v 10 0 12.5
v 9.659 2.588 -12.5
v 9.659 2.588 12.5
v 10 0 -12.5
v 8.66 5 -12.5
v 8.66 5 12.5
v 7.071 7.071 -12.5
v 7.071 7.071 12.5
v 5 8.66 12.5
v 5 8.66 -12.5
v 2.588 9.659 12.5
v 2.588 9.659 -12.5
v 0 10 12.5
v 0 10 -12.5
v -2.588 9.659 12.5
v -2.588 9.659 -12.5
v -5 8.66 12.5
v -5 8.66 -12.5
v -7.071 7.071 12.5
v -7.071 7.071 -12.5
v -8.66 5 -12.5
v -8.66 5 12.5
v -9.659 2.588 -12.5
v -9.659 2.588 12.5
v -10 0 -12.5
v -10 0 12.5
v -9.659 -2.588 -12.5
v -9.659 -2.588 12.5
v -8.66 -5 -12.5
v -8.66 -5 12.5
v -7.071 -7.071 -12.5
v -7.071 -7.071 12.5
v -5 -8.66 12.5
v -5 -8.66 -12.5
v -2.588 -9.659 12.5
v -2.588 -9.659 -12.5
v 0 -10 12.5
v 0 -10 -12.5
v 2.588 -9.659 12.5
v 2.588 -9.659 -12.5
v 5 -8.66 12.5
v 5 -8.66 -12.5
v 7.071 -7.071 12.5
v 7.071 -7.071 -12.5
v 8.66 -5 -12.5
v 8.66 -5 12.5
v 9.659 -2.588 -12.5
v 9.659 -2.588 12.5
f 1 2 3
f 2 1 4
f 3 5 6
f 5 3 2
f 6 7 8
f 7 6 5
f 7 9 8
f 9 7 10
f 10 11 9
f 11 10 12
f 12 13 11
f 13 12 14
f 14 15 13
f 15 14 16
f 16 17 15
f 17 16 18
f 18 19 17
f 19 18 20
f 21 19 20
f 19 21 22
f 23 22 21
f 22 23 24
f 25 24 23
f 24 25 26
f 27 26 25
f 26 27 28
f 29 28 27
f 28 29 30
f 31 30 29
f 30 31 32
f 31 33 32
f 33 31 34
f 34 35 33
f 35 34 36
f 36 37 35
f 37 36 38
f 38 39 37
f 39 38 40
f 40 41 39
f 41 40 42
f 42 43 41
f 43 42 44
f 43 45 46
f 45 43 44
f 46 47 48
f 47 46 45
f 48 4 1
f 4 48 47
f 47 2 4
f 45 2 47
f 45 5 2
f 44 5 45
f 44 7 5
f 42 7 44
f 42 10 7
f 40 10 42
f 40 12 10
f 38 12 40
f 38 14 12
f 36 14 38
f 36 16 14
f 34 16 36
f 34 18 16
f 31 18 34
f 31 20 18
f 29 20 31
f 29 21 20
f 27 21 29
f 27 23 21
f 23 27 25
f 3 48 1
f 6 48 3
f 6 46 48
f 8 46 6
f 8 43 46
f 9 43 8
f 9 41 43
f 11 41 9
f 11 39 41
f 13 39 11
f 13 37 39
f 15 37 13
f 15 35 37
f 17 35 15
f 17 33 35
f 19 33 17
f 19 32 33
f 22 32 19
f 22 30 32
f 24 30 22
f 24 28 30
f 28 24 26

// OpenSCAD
// Cylinder rendering test  
$fn = 24; // Smooth cylinder

// Cylinder with height and radius
cylinder(h=25, r=10, center=true);

// This should render as an actual cylinder mesh
